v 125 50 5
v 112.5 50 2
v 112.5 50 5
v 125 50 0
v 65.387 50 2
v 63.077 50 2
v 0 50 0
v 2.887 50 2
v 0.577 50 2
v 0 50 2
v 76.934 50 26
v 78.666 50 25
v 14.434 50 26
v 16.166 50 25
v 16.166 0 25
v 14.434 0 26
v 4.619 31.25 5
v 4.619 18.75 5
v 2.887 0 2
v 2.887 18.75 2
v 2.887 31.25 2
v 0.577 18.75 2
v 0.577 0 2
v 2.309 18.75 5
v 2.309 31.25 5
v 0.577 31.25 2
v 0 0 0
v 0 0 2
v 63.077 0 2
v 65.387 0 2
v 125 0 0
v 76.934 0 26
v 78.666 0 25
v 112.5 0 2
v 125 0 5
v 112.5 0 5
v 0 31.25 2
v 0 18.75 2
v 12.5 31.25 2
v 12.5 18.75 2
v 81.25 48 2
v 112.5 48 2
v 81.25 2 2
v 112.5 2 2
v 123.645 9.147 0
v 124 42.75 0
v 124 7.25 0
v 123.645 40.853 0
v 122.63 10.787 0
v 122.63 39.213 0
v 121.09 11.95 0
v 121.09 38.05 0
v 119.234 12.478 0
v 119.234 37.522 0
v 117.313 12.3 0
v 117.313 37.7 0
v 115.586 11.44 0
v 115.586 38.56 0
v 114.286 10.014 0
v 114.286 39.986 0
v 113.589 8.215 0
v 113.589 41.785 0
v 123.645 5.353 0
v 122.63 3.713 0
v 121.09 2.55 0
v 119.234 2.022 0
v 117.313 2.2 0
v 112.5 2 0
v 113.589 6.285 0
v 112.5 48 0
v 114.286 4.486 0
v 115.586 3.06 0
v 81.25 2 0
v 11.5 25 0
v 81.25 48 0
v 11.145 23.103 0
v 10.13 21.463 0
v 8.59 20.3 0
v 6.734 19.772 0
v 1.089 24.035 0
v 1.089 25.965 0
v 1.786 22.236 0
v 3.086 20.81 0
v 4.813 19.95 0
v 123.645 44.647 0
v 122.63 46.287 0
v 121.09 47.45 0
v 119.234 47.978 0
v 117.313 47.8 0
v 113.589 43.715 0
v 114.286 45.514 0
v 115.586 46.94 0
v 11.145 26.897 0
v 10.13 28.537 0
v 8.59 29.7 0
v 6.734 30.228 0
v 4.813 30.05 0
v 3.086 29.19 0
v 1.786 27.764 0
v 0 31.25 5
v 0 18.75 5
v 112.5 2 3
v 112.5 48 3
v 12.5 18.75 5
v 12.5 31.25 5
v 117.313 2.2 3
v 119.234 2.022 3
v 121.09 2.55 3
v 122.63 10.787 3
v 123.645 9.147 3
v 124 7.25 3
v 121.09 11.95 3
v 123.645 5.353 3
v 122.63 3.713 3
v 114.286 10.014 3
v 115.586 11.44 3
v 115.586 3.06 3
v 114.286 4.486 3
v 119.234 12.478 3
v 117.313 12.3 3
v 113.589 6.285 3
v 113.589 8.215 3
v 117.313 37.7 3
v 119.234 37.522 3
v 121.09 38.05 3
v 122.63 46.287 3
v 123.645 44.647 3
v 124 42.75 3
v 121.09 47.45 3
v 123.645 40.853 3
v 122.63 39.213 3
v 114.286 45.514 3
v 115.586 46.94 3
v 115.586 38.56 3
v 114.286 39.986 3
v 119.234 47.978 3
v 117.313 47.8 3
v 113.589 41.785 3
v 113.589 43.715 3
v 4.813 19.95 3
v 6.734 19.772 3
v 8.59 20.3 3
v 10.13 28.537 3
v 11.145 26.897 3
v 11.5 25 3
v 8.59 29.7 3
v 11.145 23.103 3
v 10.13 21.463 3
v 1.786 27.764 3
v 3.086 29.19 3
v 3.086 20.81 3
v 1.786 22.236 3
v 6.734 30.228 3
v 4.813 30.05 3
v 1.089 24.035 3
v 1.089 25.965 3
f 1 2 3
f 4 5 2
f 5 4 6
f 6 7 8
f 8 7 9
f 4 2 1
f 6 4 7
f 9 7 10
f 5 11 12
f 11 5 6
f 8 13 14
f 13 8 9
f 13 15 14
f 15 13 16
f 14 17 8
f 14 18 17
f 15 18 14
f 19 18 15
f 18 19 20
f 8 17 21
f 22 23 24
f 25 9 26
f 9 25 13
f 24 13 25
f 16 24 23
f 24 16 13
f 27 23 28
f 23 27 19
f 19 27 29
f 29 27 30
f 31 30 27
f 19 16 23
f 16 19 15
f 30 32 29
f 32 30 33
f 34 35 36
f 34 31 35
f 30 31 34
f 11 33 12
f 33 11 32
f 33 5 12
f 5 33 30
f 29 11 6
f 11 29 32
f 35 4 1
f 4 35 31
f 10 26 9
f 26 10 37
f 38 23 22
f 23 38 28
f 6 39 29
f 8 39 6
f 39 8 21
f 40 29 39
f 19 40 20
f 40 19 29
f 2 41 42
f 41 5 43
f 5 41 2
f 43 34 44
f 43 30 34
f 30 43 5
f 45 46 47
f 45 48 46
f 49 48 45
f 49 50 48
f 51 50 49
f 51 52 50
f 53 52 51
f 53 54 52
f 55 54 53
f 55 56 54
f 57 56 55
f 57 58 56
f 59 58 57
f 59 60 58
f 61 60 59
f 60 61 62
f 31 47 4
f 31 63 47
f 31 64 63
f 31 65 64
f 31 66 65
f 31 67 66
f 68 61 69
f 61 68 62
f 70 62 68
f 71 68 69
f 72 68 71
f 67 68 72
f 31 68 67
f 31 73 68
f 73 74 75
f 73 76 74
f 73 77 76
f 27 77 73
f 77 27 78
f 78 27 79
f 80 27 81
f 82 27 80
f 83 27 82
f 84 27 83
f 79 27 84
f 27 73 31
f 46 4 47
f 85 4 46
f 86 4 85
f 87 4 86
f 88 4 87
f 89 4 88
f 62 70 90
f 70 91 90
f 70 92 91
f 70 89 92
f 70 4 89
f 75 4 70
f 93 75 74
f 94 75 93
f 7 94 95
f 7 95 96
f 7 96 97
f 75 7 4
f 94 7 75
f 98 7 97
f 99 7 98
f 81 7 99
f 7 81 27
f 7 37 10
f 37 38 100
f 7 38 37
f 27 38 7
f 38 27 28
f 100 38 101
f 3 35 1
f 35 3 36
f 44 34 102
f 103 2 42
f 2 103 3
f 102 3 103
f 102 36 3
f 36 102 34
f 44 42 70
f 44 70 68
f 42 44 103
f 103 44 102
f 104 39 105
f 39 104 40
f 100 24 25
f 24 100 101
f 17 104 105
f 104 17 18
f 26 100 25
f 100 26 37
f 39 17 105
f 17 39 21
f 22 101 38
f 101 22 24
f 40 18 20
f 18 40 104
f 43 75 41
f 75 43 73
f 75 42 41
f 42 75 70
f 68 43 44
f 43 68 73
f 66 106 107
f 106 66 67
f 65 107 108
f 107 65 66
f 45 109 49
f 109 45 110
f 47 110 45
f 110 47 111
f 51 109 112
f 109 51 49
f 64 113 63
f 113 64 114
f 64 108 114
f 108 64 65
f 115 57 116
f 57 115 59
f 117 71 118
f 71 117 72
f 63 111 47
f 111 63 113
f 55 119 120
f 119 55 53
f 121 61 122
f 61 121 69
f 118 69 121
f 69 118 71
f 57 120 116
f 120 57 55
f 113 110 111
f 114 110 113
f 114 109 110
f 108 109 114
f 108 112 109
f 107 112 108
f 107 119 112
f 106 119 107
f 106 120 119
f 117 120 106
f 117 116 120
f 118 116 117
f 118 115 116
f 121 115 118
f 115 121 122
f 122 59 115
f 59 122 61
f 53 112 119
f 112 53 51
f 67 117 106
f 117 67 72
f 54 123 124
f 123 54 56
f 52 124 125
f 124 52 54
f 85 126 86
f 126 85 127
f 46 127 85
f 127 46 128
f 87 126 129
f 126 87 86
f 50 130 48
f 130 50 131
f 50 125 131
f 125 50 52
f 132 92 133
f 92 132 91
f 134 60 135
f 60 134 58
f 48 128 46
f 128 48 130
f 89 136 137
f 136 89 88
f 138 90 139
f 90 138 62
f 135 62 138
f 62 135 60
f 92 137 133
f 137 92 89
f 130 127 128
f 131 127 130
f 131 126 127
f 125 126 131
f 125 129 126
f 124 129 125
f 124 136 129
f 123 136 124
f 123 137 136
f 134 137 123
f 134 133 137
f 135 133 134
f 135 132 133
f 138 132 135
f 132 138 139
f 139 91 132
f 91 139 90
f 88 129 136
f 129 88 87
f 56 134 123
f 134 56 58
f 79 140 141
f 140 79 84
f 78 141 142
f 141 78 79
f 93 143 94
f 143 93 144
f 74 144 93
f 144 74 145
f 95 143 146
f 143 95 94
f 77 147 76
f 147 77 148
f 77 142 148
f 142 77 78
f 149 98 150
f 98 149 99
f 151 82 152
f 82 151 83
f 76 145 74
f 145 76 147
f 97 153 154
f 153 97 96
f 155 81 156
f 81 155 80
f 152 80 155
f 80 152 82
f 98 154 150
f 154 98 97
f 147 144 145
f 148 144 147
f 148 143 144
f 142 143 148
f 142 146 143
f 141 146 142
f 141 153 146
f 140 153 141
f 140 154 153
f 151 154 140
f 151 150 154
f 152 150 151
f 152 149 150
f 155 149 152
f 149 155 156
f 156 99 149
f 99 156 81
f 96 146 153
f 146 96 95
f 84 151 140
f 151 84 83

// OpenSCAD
// file: measurements.scad
tower_x = 50;
tower_y = 50;
tower_z = 125;
wall_thickness = 2;

leg_height = 4;
leg_width = 4;

/*
connector_r = 1;
connector_height = 2;
connector_y_positions = [tower_y - wall_thickness - connector_r - 2, wall_thickness + connector_r + 2];
connector_x_positions = [5, tower_z / 2, tower_z - leg_height - 4];
*/

magnent_diameter = 10.5;

module magnent() {
    translate([0, 0, -1]) cylinder(4, d1=magnent_diameter, d2 = magnent_diameter);
}
// main file
include <measurements.scad>

mag_wall_thickness = 5;
mag_wall_height = magnent_diameter + 2;

difference() {
    union() {
        cube([tower_z, tower_x, wall_thickness]);
        translate([tower_z - mag_wall_height, 0, 0]) cube([mag_wall_height, tower_x, mag_wall_thickness]);
        translate([0, tower_x / 2 - mag_wall_height / 2, 0]) cube([mag_wall_height, mag_wall_height, mag_wall_thickness]);
        
        translate([0, 0, 1]) {
            rotate([0, 30, 0]) cube([wall_thickness, tower_x, tower_y / 2 * 1.1547]);

            translate([tower_z / 2, 0, 0]) rotate([0, 30, 0]) cube([wall_thickness, tower_x, tower_y / 2 * 1.1547]);
        }
    }

    // the opening for the dice
    // The +1 is for clipping issues
    translate([tower_z - tower_z / 4 - mag_wall_height, wall_thickness, 0]) {
        cube([tower_z / 4, tower_x - wall_thickness * 2, wall_thickness + 1]);
    }

    // The holes for magnents
    translate([tower_z - mag_wall_height /2, magnent_diameter / 2 + wall_thickness, 0]) magnent();
    translate([tower_z - mag_wall_height /2, tower_x - (magnent_diameter / 2 + wall_thickness), 0]) magnent();
    translate([mag_wall_height / 2, tower_x / 2, 0]) magnent();
}
